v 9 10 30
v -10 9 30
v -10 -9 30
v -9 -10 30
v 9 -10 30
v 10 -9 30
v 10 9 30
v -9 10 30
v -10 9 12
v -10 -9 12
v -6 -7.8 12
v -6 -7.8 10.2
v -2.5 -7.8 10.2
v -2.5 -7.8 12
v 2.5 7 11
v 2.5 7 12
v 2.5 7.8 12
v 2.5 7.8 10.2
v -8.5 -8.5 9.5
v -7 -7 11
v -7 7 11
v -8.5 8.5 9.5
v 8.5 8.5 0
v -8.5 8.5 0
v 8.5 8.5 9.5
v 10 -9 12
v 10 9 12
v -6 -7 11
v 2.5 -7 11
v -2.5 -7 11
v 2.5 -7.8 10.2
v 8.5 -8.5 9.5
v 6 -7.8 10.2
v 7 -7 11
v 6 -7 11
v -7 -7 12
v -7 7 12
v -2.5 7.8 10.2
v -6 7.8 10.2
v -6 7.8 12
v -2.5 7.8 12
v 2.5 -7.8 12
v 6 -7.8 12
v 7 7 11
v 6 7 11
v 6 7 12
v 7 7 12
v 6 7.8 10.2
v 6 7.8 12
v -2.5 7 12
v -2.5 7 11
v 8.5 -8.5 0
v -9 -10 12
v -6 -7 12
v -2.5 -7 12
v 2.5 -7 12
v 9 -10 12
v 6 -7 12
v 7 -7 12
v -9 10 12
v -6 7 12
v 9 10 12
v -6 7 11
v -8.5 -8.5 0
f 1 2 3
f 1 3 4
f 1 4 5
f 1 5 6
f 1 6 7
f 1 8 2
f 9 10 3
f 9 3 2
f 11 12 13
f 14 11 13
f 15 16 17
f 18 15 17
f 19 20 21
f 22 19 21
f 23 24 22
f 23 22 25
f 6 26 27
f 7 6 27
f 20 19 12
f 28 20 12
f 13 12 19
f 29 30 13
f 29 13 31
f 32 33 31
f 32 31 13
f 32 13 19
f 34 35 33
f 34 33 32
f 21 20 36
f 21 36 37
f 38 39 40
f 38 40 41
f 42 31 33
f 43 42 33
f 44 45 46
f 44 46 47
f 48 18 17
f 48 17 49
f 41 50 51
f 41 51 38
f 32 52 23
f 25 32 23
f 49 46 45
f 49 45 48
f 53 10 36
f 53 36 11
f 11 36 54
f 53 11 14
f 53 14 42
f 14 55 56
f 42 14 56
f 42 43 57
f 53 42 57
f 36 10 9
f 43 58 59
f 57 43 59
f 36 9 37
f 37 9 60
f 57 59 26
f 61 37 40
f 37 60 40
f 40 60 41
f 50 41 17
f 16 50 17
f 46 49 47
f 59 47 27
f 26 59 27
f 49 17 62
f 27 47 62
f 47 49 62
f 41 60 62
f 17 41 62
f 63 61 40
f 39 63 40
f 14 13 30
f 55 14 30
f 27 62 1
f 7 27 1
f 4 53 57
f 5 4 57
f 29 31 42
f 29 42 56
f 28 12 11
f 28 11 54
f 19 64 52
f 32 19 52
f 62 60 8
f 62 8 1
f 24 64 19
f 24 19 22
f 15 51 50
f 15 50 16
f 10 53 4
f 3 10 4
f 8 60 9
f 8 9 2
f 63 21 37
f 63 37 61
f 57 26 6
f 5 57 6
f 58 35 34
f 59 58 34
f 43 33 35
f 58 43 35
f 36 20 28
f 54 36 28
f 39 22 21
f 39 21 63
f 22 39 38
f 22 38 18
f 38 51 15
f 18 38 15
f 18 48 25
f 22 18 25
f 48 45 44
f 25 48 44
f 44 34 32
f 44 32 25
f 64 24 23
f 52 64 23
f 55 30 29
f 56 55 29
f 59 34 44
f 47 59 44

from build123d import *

# Parameters (mm, degrees)
BOX005_W        = 20
BOX005_H        = 20
BOX005_DEPTH    = 18
CHAMFER003_SIZE = 1
BOX004_W        = 17
BOX004_H        = 17
BOX004_DEPTH    = 11
CHAMFER002_SIZE = 1.5
BOX003_W        = 14
BOX003_H        = 14
BOX003_DEPTH    = 1
BOX008_W        = 3.5
BOX008_H        = 1
BOX008_DEPTH    = 2
BOX007_W        = 3.5
BOX007_H        = 1
BOX007_DEPTH    = 2
BOX006_W        = 3.5
BOX006_H        = 1
BOX006_DEPTH    = 2
BOX009_W        = 3.5
BOX009_H        = 1
BOX009_DEPTH    = 2


with BuildPart() as chamfer003:
    # Box005 → Box005 (new body)
    with BuildSketch(Plane(origin=(-10, -10, 12), x_dir=(1, 0, 0), z_dir=(0, 0, 1))):
        with Locations((10, 10)):
            Rectangle(BOX005_W, BOX005_H)
    extrude(amount=BOX005_DEPTH)

    # Chamfer003
    chamfer003_edges = [chamfer003.edges().sort_by_distance(p)[0] for p in [
        (-10, -10, 21),
        (-10, 10, 21),
        (10, -10, 21),
        (10, 10, 21),
    ]]
    chamfer(chamfer003_edges, length=CHAMFER003_SIZE)


with BuildPart() as chamfer002:
    # Box004 → Box004 (new body)
    with BuildSketch(Plane(origin=(-8.5, -8.5, 0), x_dir=(1, 0, 0), z_dir=(0, 0, 1))):
        with Locations((8.5, 8.5)):
            Rectangle(BOX004_W, BOX004_H)
    extrude(amount=BOX004_DEPTH)

    # Chamfer002
    chamfer002_edges = [chamfer002.edges().sort_by_distance(p)[0] for p in [
        (-8.5, 0, 11),
        (8.5, 0, 11),
        (0, -8.5, 11),
        (0, 8.5, 11),
    ]]
    chamfer(chamfer002_edges, length=CHAMFER002_SIZE)


with BuildPart() as cube003:
    # Box003 → Box003 (new body)
    with BuildSketch(Plane(origin=(-7, -7, 11), x_dir=(1, 0, 0), z_dir=(0, 0, 1))):
        with Locations((7, 7)):
            Rectangle(BOX003_W, BOX003_H)
    extrude(amount=BOX003_DEPTH)


with BuildPart() as cube008:
    # Box008 → Box008 (new body)
    with BuildSketch(Plane(origin=(2.5, 6.8, 10), x_dir=(1, 0, 0), z_dir=(0, 0, 1))):
        with Locations((1.75, 0.5)):
            Rectangle(BOX008_W, BOX008_H)
    extrude(amount=BOX008_DEPTH)


with BuildPart() as cube007:
    # Box007 → Box007 (new body)
    with BuildSketch(Plane(origin=(2.5, -7.8, 10), x_dir=(1, 0, 0), z_dir=(0, 0, 1))):
        with Locations((1.75, 0.5)):
            Rectangle(BOX007_W, BOX007_H)
    extrude(amount=BOX007_DEPTH)


with BuildPart() as cube006:
    # Box006 → Box006 (new body)
    with BuildSketch(Plane(origin=(-6, -7.8, 10), x_dir=(1, 0, 0), z_dir=(0, 0, 1))):
        with Locations((1.75, 0.5)):
            Rectangle(BOX006_W, BOX006_H)
    extrude(amount=BOX006_DEPTH)


with BuildPart() as button_slot:
    # Box009 → Box009 (new body)
    with BuildSketch(Plane(origin=(-6, 6.8, 10), x_dir=(1, 0, 0), z_dir=(0, 0, 1))):
        with Locations((1.75, 0.5)):
            Rectangle(BOX009_W, BOX009_H)
    extrude(amount=BOX009_DEPTH)

    # Fusion: union Cube008, Cube007, Cube006
    add(cube008.part)
    add(cube007.part)
    add(cube006.part)

    # Fusion001: union Chamfer003, Chamfer002, Cube003
    add(chamfer003.part)
    add(chamfer002.part)
    add(cube003.part)


solid = button_slot.part
